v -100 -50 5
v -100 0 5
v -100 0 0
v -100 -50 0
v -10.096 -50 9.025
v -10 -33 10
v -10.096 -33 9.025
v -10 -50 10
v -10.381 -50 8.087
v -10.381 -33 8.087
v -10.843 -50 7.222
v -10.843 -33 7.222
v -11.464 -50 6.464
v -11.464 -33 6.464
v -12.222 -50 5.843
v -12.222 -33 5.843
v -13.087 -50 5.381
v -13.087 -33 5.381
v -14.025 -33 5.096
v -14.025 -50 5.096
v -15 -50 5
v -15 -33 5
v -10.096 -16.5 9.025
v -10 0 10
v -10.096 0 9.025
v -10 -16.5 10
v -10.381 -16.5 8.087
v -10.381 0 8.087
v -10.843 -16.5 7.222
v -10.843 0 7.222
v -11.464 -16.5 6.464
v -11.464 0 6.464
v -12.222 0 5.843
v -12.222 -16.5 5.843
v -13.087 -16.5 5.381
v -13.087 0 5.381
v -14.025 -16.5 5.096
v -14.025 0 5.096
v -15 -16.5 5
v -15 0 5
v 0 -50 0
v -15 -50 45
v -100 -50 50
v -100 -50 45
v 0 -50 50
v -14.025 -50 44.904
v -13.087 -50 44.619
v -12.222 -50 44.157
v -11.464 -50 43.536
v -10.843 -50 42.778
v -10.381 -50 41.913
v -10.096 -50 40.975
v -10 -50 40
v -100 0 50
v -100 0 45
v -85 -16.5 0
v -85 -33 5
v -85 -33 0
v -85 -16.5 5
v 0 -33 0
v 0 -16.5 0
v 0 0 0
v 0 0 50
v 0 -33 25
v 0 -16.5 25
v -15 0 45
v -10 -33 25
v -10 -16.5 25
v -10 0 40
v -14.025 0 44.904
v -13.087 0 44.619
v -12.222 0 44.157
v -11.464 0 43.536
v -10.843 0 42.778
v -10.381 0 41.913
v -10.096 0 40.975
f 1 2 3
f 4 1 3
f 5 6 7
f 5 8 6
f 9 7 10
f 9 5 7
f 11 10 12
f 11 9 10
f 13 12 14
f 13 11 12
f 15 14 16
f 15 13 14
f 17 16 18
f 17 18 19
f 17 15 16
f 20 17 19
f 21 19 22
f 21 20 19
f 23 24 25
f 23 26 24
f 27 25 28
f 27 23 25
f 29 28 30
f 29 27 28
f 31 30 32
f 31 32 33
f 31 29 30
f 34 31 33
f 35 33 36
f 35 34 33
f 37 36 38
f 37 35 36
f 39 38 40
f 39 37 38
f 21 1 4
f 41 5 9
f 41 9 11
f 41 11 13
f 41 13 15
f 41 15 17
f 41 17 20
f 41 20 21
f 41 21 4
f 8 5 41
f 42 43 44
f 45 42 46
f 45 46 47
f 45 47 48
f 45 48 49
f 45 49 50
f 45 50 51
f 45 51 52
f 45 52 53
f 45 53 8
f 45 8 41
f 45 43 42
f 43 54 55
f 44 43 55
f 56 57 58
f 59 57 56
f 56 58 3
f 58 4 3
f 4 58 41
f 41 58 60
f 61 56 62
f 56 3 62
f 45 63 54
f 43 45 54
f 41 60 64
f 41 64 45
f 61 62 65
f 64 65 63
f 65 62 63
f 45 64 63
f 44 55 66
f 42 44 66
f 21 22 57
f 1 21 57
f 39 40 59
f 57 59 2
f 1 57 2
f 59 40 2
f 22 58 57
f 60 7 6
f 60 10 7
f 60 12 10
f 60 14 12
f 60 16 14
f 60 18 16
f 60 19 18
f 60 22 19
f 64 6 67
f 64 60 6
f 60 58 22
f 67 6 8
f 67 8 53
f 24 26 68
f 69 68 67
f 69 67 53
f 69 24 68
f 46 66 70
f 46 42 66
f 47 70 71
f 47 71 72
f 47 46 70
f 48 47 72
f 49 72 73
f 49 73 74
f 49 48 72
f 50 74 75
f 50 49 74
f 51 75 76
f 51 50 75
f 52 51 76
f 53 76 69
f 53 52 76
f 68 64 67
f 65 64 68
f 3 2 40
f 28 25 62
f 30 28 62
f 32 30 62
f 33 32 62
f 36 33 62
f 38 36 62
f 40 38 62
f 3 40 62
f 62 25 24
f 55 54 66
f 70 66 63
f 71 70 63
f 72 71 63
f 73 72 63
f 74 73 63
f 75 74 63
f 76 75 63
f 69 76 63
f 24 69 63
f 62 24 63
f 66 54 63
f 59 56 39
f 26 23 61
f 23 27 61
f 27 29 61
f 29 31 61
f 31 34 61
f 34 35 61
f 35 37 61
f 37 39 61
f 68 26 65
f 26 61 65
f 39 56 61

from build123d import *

# Parameters (mm, degrees)
F0_W     = 10
F0_H     = 40
F1_DEPTH = 50
F2_W     = 16.5
F2_H     = 25
F3_DEPTH = 85
F4_R     = 5


with BuildPart() as f1:
    # F0 (on Front) → F1 (new body)
    with BuildSketch(Plane.XZ):
        Polygon((-100, 0), (0, 0), (0, 5), (-10, 5), (-100, 5), align=None)
        Polygon((-10, 45), (0, 45), (0, 50), (-100, 50), (-100, 45), align=None)
        with Locations((-5, 25)):
            Rectangle(F0_W, F0_H)
    extrude(amount=F1_DEPTH)

    # F2 (on Right) → F3 (cut)
    with BuildSketch(Plane.YZ):
        with Locations((-24.75, 12.5)):
            Rectangle(F2_W, F2_H)
    extrude(amount=-F3_DEPTH, mode=Mode.SUBTRACT)

    # F4
    f4_edges = [f1.edges().sort_by_distance(p)[0] for p in [
        (-10, -8.25, 5),
        (-10, -41.5, 5),
        (-10, -25, 45),
    ]]
    fillet(f4_edges, radius=F4_R)


solid = f1.part
